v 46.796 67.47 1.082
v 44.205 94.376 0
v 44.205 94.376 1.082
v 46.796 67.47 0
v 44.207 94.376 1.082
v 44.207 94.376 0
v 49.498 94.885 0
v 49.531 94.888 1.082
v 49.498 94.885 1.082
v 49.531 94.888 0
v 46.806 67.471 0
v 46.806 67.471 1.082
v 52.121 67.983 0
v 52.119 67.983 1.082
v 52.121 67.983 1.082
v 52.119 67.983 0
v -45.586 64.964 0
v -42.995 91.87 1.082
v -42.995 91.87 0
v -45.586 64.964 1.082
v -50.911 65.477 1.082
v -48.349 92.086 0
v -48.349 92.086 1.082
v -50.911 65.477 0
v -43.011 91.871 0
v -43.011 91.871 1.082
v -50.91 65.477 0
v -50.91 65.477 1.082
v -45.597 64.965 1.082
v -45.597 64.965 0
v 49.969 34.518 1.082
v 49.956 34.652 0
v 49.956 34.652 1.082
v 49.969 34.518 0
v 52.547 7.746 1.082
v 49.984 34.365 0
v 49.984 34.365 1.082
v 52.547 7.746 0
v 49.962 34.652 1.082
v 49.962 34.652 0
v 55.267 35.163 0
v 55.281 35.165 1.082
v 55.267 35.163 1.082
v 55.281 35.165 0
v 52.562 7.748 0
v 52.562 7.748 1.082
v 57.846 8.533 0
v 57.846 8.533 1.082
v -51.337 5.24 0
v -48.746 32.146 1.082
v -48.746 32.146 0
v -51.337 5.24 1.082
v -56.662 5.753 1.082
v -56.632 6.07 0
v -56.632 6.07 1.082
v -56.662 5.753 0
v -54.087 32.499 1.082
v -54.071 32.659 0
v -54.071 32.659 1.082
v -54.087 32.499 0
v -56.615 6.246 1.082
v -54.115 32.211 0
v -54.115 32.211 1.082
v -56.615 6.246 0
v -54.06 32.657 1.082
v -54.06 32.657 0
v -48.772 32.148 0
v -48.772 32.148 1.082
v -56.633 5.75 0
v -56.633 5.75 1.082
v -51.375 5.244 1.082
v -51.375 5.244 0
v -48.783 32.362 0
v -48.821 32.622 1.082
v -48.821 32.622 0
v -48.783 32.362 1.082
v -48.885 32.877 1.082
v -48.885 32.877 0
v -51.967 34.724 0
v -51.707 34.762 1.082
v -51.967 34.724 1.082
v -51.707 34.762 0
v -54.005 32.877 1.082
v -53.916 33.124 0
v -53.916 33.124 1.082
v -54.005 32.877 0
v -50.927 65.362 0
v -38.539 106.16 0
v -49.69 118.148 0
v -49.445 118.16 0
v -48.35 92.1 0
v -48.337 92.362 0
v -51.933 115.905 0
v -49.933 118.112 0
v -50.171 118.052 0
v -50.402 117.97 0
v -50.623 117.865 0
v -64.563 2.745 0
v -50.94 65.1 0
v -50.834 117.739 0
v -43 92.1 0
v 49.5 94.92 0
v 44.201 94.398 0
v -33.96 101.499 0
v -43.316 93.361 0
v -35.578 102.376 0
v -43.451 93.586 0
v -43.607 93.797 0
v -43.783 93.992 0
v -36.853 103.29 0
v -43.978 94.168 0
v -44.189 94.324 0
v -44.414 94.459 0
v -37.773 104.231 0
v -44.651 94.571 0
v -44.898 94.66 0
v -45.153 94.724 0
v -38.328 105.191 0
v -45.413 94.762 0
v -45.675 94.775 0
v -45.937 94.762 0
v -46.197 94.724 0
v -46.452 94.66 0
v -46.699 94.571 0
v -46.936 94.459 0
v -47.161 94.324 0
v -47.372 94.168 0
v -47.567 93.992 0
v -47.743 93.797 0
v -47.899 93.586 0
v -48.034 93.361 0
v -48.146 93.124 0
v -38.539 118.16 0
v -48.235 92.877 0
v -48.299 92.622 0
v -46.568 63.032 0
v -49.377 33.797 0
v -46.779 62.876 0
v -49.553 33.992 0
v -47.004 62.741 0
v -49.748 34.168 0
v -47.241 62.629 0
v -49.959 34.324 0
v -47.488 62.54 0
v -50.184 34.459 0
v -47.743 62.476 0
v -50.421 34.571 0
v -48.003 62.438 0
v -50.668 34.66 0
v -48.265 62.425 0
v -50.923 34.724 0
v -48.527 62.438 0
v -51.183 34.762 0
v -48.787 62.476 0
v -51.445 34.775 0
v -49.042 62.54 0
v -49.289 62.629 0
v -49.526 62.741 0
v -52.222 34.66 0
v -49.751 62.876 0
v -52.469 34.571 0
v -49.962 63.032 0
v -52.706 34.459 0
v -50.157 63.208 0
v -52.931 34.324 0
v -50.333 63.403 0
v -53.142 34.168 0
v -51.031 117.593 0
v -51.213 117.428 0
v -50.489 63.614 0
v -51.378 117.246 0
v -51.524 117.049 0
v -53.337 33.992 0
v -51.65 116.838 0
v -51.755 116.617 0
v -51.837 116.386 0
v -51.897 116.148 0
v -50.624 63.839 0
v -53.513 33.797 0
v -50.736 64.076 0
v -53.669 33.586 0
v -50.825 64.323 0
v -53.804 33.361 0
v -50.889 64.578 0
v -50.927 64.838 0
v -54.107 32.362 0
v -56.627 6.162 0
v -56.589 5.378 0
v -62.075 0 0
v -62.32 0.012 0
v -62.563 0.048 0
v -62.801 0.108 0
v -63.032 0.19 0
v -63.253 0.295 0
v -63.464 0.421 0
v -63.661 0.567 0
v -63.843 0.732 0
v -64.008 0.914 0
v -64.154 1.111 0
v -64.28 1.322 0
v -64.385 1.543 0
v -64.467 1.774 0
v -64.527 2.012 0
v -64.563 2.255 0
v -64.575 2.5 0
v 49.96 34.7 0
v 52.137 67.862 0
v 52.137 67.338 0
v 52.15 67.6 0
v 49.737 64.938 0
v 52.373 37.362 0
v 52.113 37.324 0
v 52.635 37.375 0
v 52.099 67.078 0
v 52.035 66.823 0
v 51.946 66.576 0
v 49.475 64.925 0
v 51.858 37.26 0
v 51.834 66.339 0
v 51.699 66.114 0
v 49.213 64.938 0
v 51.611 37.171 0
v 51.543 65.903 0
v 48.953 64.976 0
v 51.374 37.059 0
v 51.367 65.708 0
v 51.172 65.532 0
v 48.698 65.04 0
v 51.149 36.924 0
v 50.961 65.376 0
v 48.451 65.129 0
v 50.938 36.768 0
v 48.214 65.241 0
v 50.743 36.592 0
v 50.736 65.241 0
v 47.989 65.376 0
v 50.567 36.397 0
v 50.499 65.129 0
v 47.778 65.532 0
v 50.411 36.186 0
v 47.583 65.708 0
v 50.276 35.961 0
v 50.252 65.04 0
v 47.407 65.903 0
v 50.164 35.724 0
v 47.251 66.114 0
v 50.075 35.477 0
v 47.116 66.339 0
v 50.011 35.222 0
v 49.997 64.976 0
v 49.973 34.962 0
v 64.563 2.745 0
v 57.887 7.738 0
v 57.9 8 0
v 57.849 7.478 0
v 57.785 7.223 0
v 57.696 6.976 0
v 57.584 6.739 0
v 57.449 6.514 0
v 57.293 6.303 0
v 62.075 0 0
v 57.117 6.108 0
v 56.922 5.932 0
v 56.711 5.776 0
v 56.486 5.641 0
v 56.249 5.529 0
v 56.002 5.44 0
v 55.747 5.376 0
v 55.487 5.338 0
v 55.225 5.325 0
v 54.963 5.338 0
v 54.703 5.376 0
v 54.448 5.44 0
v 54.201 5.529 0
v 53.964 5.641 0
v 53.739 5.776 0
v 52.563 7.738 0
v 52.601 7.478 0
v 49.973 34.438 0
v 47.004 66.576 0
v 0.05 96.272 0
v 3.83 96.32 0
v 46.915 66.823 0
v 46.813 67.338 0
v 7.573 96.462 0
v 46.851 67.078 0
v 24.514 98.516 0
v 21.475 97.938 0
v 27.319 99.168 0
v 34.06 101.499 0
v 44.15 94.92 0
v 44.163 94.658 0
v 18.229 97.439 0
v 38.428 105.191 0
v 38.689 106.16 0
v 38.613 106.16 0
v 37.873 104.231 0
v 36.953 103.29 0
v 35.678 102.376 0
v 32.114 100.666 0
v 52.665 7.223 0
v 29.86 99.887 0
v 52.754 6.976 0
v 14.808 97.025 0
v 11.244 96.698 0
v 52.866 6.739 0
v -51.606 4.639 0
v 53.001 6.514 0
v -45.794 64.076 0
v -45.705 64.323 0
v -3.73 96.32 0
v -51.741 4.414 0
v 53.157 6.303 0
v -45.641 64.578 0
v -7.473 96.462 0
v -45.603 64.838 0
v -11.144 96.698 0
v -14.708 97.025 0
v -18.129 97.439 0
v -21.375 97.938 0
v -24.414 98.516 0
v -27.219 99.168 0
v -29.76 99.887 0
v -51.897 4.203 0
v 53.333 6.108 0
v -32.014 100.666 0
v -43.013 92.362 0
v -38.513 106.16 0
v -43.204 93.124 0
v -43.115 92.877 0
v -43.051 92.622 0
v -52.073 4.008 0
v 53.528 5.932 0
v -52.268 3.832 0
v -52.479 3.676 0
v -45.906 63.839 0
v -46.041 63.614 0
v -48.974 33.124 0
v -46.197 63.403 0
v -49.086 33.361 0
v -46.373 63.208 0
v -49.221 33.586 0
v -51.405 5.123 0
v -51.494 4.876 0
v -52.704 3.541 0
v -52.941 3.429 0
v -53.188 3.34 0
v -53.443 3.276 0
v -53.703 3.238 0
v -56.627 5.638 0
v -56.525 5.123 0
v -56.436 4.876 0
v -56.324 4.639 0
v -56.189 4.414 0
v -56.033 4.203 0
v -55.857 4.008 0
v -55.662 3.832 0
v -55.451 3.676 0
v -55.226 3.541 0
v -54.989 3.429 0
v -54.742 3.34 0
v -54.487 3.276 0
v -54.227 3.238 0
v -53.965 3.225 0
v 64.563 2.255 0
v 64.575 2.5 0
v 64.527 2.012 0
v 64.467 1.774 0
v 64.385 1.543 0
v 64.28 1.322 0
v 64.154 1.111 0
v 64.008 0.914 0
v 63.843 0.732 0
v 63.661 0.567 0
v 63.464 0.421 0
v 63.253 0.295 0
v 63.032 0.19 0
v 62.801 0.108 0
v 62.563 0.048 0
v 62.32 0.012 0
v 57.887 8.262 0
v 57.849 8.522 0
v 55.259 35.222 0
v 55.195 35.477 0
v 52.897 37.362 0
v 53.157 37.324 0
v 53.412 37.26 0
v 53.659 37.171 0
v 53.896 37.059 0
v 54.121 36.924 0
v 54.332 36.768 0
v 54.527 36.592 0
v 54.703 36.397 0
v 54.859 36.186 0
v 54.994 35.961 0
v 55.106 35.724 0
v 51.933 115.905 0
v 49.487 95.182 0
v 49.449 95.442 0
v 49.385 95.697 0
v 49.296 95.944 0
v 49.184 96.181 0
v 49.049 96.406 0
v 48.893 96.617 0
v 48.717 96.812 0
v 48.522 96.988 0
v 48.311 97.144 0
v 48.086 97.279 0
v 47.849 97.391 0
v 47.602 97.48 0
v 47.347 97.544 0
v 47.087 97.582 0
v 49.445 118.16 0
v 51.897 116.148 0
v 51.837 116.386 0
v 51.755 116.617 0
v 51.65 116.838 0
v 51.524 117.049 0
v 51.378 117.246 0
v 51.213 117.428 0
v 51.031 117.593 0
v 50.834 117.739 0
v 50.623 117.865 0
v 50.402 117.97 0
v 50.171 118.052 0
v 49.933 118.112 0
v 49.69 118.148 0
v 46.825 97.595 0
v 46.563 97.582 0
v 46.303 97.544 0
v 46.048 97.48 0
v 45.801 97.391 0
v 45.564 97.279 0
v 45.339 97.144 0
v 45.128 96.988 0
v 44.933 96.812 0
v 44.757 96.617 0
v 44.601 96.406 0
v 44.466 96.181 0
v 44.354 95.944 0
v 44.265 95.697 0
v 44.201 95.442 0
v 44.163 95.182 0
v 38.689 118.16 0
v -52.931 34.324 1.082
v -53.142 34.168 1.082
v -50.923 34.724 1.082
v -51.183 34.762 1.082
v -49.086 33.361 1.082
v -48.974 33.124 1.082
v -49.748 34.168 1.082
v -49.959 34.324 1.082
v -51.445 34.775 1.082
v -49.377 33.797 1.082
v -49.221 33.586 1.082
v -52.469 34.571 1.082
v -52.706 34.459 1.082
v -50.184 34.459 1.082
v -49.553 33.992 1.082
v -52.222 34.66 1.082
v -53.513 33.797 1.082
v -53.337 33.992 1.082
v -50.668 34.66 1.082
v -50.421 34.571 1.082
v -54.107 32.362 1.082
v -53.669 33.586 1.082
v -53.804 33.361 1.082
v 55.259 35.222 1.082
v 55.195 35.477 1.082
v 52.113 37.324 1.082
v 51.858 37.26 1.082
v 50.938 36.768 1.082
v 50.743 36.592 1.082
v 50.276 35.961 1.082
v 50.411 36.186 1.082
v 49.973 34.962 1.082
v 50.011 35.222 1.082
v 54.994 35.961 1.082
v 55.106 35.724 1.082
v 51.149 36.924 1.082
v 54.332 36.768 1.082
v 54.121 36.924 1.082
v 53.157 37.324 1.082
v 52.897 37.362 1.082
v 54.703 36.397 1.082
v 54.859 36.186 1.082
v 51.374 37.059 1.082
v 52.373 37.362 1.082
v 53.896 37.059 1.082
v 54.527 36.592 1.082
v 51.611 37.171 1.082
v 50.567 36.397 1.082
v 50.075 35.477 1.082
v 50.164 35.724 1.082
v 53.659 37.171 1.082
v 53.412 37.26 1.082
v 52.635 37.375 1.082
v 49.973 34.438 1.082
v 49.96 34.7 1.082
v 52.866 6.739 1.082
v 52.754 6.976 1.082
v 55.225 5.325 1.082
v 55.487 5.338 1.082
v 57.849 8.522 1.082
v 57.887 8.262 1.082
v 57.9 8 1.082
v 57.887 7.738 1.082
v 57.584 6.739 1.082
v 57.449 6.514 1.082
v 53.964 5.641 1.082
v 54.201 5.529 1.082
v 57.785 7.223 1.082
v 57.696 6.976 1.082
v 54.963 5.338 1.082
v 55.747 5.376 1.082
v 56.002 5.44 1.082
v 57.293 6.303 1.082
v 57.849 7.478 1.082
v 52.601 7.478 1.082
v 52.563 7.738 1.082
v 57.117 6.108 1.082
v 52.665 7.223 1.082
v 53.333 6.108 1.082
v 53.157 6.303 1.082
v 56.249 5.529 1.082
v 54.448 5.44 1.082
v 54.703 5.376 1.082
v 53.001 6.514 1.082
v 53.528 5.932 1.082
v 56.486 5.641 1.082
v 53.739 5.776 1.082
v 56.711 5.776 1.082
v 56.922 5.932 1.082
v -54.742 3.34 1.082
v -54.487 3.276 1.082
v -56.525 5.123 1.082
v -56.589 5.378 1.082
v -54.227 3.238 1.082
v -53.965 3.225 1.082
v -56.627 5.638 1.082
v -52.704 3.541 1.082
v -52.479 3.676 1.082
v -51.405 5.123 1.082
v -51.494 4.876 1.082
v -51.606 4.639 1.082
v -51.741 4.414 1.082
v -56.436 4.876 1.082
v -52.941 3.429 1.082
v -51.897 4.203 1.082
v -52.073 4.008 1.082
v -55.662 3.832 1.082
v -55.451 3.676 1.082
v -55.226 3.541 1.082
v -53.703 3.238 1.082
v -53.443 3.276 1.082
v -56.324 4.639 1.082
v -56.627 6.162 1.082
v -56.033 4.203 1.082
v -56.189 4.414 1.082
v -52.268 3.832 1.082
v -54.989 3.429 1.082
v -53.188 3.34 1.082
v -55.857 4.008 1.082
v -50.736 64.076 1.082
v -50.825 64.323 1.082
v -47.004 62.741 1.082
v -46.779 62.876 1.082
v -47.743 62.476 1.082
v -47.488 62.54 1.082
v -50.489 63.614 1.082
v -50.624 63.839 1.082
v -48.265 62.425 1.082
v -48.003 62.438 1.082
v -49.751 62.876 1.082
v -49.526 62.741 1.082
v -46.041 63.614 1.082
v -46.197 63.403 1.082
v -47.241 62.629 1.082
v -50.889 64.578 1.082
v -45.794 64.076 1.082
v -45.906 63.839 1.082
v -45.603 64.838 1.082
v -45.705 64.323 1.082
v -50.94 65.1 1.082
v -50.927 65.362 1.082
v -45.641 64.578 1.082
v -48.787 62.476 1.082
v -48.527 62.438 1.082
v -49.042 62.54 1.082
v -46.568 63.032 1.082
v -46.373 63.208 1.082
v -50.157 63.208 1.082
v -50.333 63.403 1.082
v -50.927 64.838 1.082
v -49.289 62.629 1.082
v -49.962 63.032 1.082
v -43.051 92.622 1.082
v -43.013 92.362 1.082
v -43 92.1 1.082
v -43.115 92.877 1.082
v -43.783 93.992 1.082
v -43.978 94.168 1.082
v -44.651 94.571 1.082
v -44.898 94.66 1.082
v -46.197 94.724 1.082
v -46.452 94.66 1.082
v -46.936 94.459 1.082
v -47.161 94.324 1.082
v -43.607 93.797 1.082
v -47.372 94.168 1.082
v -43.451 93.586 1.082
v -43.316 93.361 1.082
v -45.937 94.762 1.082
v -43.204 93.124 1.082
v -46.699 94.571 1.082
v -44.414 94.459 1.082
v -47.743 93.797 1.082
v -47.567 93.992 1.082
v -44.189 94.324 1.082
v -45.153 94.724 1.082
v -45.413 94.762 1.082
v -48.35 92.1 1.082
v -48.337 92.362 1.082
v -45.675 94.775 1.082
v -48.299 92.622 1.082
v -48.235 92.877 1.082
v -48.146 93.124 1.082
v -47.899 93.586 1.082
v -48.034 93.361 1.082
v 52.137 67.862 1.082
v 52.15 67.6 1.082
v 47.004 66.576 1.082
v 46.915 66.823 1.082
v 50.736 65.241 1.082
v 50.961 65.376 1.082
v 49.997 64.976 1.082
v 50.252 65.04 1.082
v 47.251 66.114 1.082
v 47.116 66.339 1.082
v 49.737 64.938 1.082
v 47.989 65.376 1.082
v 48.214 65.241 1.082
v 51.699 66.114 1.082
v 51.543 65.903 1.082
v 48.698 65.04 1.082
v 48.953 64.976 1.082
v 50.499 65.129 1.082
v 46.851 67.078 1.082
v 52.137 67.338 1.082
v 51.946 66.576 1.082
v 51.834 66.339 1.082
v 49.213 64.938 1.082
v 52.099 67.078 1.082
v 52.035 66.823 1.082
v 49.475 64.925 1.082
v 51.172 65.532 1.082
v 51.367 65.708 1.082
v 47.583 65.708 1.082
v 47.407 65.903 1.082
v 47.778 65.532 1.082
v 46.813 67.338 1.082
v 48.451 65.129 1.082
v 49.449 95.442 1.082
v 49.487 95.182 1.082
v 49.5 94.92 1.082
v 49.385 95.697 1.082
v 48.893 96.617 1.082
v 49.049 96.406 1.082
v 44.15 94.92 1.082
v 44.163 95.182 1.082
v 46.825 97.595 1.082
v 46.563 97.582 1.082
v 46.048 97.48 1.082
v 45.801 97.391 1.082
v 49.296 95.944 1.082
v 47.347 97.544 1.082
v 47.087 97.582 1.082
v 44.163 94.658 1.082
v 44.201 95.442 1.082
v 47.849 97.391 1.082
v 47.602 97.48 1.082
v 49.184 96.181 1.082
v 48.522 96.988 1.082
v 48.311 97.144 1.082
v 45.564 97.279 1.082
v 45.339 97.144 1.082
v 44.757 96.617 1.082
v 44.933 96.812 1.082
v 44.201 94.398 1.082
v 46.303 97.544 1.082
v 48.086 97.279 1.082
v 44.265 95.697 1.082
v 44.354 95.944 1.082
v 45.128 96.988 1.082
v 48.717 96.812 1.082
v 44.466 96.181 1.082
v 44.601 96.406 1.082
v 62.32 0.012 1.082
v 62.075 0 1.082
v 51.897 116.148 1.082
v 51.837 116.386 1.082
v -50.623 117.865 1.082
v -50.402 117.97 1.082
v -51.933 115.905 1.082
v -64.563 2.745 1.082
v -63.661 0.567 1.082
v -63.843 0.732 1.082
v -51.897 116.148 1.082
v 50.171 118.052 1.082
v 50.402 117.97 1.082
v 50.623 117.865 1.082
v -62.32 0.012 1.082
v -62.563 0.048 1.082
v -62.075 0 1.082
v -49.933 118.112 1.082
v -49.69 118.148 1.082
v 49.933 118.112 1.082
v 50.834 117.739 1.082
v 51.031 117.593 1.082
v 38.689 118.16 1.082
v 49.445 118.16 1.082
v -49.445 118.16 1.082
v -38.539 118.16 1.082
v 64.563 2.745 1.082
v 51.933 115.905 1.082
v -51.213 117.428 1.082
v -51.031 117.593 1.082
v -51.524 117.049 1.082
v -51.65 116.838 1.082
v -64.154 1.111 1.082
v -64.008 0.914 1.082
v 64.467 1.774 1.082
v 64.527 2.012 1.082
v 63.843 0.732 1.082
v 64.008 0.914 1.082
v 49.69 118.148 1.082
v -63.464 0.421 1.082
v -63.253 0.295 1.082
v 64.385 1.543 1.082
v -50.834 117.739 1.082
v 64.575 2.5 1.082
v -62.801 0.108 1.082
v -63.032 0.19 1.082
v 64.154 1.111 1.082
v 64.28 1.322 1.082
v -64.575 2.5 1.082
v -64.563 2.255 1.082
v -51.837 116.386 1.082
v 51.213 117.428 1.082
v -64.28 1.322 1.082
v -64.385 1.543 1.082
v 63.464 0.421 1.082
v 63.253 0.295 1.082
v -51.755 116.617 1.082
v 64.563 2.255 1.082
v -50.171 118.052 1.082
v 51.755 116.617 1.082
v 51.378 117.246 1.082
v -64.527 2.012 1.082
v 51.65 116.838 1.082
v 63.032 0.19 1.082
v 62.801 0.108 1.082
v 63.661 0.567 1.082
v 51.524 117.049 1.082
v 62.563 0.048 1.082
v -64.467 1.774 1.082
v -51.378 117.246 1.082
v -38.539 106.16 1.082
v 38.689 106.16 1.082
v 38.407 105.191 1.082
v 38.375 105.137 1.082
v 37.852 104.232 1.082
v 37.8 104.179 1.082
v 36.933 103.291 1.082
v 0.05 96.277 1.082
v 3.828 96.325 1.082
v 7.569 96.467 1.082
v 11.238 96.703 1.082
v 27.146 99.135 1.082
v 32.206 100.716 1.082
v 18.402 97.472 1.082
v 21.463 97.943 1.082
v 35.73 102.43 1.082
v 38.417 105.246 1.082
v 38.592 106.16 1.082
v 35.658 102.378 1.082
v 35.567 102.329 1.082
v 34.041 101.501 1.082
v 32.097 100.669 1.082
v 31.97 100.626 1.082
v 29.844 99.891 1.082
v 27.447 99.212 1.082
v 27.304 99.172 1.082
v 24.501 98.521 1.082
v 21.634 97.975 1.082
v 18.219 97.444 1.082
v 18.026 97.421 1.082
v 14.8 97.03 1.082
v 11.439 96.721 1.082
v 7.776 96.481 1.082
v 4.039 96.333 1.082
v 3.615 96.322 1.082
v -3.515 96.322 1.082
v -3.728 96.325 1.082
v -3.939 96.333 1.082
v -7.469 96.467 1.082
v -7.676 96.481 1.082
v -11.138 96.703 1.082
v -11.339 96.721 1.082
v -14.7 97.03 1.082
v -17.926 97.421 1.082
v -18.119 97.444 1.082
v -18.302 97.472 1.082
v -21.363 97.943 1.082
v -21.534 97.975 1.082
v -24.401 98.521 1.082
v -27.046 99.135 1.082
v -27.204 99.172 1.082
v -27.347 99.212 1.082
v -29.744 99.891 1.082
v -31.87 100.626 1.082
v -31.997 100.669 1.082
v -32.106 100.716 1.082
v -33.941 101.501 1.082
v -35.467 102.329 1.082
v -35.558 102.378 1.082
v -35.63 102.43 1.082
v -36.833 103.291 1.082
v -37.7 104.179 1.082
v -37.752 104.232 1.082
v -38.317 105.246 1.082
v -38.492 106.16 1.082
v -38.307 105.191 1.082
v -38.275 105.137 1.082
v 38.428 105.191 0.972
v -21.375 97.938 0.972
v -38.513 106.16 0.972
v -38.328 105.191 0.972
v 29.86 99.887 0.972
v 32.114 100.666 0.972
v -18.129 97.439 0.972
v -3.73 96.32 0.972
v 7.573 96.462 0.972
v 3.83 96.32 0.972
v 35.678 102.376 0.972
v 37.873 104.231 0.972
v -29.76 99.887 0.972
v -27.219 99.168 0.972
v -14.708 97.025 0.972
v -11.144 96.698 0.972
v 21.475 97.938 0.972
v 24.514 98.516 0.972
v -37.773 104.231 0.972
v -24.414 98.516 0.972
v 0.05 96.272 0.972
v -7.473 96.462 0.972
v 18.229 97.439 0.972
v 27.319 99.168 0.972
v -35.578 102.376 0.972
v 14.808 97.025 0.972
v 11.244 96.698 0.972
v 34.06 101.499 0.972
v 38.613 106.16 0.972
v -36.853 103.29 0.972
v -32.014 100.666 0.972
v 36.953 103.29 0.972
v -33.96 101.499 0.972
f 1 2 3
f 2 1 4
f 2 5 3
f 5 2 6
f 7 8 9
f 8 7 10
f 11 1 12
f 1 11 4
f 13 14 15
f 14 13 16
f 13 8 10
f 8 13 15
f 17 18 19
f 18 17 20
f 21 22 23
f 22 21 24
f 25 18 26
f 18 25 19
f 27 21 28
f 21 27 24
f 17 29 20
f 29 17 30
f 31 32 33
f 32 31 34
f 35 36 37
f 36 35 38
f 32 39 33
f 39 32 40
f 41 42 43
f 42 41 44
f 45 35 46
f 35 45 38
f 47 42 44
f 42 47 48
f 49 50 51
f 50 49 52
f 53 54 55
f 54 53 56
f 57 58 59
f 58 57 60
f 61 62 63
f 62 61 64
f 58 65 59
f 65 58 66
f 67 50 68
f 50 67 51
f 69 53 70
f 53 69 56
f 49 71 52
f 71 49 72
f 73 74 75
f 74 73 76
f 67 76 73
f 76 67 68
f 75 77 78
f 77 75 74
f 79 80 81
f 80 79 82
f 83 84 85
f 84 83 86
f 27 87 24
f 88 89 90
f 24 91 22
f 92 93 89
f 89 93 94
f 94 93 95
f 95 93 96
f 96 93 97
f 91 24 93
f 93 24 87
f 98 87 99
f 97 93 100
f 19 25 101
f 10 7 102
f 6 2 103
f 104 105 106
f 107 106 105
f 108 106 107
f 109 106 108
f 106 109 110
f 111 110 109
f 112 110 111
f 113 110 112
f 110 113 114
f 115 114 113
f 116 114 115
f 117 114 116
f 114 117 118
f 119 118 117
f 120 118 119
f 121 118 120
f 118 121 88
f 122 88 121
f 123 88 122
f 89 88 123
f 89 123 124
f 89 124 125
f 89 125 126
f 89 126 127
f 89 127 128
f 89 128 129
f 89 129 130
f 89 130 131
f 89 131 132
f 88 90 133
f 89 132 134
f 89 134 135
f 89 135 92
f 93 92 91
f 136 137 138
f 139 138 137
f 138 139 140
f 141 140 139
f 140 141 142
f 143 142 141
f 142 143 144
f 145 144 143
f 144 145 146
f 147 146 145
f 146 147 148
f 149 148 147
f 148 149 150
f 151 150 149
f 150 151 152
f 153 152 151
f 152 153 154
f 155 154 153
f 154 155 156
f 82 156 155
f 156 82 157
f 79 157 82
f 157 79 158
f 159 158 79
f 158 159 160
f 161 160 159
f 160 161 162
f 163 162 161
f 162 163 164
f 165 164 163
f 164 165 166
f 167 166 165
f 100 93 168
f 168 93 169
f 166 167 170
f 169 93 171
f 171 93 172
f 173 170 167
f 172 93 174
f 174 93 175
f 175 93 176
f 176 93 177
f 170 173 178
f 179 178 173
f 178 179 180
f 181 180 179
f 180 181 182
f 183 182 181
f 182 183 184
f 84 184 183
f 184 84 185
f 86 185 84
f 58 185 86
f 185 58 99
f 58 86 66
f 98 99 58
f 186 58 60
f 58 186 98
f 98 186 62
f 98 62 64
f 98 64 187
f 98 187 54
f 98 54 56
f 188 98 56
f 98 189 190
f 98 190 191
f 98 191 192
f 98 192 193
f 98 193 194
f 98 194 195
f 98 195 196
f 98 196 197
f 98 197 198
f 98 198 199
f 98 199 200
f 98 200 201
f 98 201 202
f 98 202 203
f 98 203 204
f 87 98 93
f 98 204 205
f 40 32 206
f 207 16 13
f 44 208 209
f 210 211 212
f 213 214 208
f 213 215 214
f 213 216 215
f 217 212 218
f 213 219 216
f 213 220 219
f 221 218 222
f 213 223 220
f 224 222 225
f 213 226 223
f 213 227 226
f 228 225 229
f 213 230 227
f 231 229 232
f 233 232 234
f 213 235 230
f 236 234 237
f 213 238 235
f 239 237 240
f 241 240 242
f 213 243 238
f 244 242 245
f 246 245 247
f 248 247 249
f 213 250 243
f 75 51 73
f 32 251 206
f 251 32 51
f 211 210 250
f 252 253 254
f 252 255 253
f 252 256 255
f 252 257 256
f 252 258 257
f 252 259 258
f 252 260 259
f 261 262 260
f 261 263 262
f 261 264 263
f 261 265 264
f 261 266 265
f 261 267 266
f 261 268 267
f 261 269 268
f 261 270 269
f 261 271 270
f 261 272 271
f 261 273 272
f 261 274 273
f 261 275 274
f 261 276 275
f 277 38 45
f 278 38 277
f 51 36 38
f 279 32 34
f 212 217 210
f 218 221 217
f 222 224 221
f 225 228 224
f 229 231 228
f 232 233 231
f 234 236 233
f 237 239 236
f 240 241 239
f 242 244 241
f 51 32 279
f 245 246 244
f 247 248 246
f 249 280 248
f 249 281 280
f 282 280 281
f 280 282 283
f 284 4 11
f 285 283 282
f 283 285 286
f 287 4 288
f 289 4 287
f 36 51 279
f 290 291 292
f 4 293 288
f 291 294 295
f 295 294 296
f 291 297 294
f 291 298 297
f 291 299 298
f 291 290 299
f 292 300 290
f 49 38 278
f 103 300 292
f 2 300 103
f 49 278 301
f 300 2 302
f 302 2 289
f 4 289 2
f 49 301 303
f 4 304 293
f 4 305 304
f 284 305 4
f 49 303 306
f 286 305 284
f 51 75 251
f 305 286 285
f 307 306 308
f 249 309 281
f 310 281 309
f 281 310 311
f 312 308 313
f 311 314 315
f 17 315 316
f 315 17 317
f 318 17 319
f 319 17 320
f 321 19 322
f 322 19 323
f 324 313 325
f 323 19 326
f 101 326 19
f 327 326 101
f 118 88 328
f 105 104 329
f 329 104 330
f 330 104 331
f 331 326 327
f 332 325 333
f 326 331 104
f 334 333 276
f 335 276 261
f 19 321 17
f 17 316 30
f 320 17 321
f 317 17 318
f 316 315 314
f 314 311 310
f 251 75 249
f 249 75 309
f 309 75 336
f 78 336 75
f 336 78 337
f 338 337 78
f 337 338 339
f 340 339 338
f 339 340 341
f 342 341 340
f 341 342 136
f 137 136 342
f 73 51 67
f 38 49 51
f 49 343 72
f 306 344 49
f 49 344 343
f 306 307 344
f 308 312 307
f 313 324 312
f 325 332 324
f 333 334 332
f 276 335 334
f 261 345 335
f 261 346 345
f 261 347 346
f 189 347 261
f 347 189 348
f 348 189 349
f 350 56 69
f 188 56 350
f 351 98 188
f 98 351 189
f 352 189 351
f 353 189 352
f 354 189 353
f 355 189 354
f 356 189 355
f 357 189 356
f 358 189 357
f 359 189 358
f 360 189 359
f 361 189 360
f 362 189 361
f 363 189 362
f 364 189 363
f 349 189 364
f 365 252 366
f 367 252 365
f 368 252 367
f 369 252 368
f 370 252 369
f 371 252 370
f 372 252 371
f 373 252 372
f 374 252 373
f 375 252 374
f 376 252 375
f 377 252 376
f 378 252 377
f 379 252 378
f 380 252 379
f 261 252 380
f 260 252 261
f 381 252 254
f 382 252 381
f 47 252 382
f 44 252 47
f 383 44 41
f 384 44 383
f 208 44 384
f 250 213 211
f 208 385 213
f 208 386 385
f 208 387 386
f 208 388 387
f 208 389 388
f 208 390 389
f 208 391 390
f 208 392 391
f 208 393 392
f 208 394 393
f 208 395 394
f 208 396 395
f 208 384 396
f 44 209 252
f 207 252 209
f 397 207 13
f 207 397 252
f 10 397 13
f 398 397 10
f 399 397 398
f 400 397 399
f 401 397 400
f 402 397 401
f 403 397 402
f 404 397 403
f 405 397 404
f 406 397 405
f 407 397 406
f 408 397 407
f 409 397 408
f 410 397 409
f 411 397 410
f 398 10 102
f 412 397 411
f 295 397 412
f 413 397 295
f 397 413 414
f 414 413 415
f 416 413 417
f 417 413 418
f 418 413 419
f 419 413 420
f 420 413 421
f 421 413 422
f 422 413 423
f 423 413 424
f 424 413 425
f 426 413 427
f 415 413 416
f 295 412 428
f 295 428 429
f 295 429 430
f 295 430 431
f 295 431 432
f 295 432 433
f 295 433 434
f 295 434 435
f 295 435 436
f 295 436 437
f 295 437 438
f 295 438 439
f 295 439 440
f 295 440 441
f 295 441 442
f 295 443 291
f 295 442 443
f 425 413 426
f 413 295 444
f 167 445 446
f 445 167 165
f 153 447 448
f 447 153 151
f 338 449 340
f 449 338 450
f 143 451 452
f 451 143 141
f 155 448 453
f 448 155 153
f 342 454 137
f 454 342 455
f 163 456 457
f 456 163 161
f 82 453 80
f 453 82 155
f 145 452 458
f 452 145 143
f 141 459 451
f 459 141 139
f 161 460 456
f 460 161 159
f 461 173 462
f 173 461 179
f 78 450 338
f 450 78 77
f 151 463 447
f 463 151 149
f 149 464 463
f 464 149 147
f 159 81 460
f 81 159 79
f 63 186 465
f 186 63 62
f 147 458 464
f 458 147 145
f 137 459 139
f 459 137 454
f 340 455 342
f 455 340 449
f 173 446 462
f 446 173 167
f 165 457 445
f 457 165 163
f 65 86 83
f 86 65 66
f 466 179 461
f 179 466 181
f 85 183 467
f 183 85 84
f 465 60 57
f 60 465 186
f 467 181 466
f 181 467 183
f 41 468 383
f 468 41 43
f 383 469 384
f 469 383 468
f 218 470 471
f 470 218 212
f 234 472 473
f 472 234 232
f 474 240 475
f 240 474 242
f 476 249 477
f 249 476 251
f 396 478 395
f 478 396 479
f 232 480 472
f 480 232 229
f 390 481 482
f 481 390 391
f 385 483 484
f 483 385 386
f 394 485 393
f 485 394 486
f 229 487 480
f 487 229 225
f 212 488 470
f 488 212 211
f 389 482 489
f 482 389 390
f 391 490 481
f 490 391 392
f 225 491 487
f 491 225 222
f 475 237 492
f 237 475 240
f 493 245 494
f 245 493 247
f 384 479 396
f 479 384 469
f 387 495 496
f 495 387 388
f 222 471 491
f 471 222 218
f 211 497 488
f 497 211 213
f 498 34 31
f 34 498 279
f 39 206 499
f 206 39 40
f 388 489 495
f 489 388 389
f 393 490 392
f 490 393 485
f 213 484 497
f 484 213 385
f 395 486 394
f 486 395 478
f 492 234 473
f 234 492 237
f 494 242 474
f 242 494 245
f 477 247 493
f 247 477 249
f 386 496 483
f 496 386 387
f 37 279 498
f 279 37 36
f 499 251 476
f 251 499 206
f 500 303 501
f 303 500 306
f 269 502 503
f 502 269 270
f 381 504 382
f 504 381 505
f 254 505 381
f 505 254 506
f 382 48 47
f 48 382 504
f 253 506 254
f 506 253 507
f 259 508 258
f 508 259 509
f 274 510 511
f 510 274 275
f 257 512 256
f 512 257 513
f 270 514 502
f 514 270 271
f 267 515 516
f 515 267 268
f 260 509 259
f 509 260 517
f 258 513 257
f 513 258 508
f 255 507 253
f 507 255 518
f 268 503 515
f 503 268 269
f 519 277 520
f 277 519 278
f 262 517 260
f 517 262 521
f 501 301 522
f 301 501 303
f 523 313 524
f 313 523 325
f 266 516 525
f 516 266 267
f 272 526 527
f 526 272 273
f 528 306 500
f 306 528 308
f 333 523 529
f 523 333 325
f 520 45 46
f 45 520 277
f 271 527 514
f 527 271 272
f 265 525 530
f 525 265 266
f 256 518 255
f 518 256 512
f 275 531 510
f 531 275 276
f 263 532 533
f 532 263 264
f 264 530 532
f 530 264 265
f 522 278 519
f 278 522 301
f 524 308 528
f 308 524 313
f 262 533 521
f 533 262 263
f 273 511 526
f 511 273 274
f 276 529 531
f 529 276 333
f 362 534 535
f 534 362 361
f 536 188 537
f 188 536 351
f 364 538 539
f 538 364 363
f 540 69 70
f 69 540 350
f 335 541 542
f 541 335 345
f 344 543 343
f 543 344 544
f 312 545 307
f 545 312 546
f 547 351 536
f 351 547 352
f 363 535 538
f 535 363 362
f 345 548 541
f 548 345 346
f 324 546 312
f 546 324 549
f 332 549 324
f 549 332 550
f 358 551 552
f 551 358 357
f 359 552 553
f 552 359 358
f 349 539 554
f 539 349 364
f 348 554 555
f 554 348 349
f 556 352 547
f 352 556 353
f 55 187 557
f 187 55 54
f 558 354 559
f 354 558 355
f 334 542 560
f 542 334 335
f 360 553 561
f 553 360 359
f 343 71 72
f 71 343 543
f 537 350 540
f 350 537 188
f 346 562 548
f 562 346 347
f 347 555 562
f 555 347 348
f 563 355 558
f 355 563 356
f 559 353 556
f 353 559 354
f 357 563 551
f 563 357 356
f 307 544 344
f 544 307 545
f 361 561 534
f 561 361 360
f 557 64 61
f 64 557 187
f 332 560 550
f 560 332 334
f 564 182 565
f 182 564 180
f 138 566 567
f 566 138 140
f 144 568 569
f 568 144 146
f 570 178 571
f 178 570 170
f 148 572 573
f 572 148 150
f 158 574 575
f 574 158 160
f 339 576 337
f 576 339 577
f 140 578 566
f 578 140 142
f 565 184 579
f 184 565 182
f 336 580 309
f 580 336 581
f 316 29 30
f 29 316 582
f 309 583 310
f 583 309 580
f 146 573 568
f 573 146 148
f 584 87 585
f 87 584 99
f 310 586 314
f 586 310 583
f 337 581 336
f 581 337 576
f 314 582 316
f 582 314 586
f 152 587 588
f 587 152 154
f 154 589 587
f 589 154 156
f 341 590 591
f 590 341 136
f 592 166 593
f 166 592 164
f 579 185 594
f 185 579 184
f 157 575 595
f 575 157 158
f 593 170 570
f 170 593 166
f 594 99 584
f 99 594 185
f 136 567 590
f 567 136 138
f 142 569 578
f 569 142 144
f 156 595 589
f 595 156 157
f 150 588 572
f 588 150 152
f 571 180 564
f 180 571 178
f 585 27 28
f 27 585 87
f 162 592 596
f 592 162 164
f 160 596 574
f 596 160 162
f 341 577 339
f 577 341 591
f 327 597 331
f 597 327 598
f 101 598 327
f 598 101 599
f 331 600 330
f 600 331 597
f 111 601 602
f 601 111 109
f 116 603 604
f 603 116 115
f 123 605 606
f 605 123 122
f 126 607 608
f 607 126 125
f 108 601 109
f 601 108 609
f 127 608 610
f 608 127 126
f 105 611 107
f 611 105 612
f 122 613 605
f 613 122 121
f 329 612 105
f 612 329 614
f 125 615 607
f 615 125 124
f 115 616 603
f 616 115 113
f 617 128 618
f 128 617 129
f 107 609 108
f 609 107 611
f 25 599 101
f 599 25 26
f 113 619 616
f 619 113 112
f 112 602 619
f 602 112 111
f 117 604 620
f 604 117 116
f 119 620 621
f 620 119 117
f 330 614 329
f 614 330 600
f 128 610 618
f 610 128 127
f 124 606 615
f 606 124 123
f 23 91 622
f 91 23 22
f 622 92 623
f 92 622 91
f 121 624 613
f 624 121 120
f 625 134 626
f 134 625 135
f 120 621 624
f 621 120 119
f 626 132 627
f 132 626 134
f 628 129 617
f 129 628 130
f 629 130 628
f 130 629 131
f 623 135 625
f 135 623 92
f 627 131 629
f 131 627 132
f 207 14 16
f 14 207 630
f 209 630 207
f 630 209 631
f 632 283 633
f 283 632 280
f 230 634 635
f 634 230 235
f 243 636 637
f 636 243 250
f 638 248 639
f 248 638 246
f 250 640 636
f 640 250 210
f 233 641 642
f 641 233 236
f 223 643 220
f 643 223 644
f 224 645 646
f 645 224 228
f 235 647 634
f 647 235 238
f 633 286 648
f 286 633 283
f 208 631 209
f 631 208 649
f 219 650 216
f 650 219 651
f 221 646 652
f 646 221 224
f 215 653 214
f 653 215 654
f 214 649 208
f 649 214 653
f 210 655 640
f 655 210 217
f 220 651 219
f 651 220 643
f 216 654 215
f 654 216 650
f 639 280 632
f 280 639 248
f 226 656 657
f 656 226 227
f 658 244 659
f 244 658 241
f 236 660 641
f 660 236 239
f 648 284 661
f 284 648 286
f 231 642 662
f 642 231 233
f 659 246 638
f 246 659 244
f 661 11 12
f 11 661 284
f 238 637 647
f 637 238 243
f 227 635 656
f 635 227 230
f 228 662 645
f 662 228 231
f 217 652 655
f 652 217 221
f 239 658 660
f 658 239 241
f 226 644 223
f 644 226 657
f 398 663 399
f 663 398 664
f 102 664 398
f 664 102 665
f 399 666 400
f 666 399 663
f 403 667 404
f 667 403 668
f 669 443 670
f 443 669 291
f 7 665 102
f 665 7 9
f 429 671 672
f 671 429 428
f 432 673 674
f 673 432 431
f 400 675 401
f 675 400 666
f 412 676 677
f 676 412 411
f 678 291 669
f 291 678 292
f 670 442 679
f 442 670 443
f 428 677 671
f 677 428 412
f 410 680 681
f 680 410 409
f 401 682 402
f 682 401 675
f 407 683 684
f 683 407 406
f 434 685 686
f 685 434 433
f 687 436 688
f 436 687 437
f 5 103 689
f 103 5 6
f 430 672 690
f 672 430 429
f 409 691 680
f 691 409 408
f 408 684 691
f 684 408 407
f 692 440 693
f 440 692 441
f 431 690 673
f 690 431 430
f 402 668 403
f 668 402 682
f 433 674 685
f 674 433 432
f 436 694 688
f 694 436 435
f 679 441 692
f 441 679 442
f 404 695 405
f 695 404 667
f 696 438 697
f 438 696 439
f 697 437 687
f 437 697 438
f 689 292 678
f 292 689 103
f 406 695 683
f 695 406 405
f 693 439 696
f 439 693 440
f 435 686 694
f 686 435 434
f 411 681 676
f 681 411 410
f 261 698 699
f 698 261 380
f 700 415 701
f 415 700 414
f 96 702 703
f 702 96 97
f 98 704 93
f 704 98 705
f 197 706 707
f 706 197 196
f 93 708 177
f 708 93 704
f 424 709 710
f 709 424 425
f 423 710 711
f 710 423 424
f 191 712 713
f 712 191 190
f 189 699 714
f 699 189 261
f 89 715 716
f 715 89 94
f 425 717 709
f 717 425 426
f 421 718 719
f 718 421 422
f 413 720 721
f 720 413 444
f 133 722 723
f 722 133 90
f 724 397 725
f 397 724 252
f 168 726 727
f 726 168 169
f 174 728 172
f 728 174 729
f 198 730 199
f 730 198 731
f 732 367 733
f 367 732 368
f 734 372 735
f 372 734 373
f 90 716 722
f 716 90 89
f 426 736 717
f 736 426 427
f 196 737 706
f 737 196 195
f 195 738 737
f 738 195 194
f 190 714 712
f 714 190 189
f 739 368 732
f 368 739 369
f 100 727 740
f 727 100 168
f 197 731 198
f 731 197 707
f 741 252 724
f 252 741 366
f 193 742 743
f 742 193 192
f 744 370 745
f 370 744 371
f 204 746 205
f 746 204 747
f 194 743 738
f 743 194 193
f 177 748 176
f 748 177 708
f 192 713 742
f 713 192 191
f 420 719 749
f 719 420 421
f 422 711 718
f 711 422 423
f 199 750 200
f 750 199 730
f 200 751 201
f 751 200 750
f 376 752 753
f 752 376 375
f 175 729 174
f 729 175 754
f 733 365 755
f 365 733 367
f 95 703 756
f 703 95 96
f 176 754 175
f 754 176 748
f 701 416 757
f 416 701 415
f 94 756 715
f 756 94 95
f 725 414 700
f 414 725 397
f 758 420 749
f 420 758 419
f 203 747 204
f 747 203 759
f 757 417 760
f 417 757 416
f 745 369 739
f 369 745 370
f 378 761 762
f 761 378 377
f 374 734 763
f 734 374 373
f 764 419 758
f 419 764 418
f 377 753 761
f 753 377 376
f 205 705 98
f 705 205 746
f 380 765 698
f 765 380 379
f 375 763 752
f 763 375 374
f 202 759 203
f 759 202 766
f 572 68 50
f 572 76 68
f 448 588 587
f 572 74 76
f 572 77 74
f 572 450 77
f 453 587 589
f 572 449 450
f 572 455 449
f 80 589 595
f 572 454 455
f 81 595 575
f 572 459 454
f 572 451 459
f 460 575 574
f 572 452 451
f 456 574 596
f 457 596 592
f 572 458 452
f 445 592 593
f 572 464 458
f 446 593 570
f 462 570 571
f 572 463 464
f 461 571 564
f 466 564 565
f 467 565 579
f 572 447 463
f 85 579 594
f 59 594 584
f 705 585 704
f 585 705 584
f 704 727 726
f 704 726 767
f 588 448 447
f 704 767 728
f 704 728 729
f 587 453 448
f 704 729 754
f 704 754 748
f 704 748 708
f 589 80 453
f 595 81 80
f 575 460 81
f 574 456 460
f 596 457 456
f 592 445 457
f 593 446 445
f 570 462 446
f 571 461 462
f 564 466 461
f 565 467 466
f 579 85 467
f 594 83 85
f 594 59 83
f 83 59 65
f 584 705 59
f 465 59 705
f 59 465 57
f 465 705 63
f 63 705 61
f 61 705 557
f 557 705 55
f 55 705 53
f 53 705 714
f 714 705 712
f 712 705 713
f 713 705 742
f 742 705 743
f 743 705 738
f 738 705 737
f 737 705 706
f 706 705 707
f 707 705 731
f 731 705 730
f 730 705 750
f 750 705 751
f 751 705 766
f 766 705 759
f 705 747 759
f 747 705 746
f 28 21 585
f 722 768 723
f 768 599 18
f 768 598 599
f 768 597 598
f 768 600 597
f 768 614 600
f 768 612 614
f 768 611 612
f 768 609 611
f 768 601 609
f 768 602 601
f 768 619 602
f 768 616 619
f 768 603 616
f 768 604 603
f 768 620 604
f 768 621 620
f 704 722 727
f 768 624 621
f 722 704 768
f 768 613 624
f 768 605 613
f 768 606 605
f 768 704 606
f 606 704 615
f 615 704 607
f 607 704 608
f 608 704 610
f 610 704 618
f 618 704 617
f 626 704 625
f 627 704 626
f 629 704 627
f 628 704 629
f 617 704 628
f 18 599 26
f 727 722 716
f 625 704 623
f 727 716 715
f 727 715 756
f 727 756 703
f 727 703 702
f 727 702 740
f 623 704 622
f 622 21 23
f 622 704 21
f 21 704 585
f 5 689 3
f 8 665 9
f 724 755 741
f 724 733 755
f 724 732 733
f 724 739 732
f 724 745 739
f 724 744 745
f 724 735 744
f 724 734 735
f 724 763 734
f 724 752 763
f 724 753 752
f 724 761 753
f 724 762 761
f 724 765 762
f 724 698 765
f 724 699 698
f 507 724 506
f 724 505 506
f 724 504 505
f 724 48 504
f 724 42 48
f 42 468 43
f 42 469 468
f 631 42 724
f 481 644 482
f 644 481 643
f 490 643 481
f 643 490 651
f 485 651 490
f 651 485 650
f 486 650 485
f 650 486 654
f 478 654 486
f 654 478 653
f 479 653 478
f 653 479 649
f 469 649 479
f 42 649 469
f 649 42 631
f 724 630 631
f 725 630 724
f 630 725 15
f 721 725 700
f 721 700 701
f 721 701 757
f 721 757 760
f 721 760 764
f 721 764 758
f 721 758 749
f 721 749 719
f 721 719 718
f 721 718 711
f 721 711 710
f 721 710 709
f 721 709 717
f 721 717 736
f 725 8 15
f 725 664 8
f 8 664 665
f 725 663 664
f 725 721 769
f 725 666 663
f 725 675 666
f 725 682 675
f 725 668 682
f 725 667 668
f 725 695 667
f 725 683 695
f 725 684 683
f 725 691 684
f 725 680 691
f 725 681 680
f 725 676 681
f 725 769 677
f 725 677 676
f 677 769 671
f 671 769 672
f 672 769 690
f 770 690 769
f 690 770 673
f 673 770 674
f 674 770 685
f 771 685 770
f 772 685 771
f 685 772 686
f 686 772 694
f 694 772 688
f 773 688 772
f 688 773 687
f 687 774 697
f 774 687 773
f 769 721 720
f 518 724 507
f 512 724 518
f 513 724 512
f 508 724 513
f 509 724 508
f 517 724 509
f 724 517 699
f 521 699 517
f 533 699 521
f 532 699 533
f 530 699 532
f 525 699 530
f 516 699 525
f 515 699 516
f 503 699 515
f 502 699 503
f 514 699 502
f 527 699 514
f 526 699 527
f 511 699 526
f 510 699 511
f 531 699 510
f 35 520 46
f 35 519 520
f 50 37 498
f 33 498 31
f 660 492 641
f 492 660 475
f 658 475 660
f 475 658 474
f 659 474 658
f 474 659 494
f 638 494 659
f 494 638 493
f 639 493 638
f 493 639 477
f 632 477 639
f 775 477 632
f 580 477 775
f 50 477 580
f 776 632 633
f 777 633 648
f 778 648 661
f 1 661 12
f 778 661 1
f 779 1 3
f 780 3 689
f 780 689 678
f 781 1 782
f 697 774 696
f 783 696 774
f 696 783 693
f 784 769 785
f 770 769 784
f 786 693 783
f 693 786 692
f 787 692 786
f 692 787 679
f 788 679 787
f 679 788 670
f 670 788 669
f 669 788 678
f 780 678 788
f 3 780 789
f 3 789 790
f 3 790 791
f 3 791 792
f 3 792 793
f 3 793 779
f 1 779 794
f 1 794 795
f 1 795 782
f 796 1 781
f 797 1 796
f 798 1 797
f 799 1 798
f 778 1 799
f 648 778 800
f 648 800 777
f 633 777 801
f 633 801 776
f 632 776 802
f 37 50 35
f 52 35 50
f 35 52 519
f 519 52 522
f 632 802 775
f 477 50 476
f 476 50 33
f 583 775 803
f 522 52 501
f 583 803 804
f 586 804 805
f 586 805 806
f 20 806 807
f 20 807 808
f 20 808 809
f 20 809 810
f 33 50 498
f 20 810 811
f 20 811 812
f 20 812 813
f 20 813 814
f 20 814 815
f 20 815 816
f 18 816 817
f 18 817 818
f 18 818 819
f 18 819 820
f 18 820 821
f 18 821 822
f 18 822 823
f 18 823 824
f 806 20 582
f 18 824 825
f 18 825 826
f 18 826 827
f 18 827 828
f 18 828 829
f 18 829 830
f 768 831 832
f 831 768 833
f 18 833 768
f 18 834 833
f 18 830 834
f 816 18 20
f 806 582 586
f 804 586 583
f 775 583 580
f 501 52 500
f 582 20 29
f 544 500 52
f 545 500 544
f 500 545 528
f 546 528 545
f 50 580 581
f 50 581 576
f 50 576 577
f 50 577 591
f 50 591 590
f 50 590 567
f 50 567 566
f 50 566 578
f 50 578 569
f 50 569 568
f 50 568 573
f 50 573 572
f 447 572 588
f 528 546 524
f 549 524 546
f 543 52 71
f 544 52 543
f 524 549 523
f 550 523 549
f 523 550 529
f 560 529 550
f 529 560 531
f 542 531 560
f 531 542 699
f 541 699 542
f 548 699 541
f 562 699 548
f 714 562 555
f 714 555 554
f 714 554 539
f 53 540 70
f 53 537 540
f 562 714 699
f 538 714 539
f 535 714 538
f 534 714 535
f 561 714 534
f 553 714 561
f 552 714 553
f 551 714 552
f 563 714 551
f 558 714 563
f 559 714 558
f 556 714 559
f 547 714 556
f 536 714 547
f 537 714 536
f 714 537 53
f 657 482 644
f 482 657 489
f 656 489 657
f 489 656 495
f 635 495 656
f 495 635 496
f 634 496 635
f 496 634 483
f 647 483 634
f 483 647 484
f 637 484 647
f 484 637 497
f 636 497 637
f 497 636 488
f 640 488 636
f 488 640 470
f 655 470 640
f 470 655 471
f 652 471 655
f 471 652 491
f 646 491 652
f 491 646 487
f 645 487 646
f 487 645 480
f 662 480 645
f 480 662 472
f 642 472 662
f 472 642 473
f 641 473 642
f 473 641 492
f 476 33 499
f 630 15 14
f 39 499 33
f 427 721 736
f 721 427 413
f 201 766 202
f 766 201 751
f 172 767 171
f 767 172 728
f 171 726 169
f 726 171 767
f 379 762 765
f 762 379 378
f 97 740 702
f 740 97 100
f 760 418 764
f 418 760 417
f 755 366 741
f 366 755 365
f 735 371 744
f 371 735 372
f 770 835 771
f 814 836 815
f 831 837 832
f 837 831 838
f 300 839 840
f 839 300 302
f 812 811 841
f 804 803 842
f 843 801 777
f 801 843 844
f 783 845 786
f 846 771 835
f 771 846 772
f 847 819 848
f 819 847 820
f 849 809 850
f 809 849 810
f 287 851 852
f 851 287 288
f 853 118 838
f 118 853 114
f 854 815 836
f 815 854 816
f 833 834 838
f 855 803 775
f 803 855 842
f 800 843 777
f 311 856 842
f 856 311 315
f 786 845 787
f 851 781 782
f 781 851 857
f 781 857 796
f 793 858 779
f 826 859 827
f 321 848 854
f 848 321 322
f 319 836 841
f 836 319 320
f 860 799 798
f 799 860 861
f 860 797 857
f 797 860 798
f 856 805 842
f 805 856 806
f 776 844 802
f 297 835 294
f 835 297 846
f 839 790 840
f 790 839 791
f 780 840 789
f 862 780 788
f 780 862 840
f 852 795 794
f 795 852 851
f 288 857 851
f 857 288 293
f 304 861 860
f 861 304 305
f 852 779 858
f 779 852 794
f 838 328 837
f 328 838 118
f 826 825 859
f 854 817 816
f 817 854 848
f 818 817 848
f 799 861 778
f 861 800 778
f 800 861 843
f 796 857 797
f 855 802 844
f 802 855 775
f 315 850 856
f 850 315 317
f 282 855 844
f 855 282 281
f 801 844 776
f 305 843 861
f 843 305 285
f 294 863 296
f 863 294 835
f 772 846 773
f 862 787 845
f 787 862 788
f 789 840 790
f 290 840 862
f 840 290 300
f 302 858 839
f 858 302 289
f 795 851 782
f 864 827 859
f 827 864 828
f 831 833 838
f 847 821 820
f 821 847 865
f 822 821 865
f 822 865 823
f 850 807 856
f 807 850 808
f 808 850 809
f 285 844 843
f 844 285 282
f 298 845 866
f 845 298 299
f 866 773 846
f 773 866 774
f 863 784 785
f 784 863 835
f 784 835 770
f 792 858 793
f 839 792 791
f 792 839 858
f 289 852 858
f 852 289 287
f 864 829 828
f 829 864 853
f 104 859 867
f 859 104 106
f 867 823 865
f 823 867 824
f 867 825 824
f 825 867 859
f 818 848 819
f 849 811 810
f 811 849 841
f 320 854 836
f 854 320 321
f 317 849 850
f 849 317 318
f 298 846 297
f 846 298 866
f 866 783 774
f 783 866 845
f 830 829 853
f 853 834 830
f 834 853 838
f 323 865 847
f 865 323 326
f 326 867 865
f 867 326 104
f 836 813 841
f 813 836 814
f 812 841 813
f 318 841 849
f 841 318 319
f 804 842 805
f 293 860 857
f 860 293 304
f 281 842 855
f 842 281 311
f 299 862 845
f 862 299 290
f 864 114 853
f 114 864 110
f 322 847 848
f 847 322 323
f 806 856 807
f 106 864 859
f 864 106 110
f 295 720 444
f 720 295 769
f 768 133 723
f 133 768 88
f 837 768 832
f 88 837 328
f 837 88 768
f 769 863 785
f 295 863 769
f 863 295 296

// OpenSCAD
// Parameters
// Forearm Width 1 (mm)
$fn = 64;

width1 = 129.15; //[45:175]

// Forearm Width 2 (mm)
width2 = 103.89; //[25:155]

// Forearm Length 1 (mm)
length1 = 118.16; //[35:165]

// Forearm Origin (mm)
origin = 0;

// Forearm Height (smallest) (mm)
heightSmall = 1.04; //[.75:1.25]

// Forearm Height (main) = 2.52 mm
heightMain = heightSmall*1.04;

 
// Diameter fillet (mm)
diameter = 5; //[3:7]


//Add the circle ports 
radius = 8.32; //[3:12]
yShift = 7; //[4:13]

//square cutout for circle ports
squareRad = 6.86; //[3:10]

//Diameter for ports connected to the end of the main shape (w/ square cutouts)
circDiam = 18.65; //[15:20]

//linear extrude of circle ports (mm)
//trying to put the variable in terms of height of the base of the trapezoid
circExtrude = heightSmall*5.07692307692;

module mainShape(){
difference() {
difference() {
difference() {
difference() {
    // Main shape
    linear_extrude(height=heightMain) {
        hull() { 
            translate([origin+diameter/2, origin+diameter/2]) circle(d=diameter);
            translate([width1-diameter/2, origin+diameter/2]) circle(d=diameter);
            translate([((width1 - width2) / 2 + width2) - diameter/2, length1-diameter/2]) circle(d=diameter);
            translate([((width1 - width2) / 2) + diameter/2, length1 - diameter/2]) circle(d=diameter);
            polygon(points=[
                [origin+diameter/2, origin+diameter/2],
                [width1-diameter/2, origin+diameter/2],
                [((width1 - width2) / 2 + width2) - diameter/2, length1-diameter/2],
                [((width1 - width2) / 2) + diameter/2, length1 - diameter/2]
            ]); 
        }
        // Adding slight raised parts over oval cutouts
    rotations_2 = [-5.5, 5.5];
    x_positions_2 = [0, width1 - 17]; 
    y_positions_2 = [0, -12]; 

    for (i = [0 : len(rotations_2) - 1]) {
    rotate(rotations_2[i]) { 
        translate([x_positions_2[i], y_positions_2[i]]) {
            cube([15.55, 84.64, heightMain + 1.28], center = false); 
        }
    }
}        // Adding slight raised parts over oval cutouts
    rotations_2 = [-5.5, 5.5];
    x_positions_2 = [0, width1 - 17]; 
    y_positions_2 = [0, -12]; 

    for (i = [0 : len(rotations_2) - 1]) {
    rotate(rotations_2[i]) { 
        translate([x_positions_2[i], y_positions_2[i]]) {
            cube([15.55, 84.64, heightMain + 1.28], center = false); 
        }
    }
}
    }
    
    

    // Arrays for cube positions and rotations
    rotations = [5.5, -5.5, 5.5, -5.5];
    x_positions = [
        0.92915214866 * width1,
        0.07742934572 * width1,
        0.92915214866 * width1,
        0.07742934572 * width1
    ];
    y_positions = [
        0.59241706161 * length1,
        0.67704807041 * length1,
        0.0846310088  * length1,
        0.1692620176  * length1
    ];

    // Subtracting cubes using a loop
    for (i = [0 : len(rotations) - 1]) {
        rotate(rotations[i]) {
            translate([x_positions[i], y_positions[i]]) {
                cube([5.35, 27.03, 3 * circExtrude], center = true);
            }
        }
    }

    // Base positions for semicircle cutouts
    x_base = 0.07742934572 * width1;
    y_base = 0.1692620176 * length1;

    // Arrays for semicircle cutout offsets
    x_offsets = [3.13, 107.21, 109.8, 0.61, 6.31, 8.9, 104.05, 101.4];
    y_offsets = [12.1, 14.7, -12, -14.1, 45.1, 72.1, 47.6, 74.92];

    // Subtracting semicircle cutouts  using a loop
    for (i = [0 : len(x_offsets) - 1]) {
        translate([x_base + x_offsets[i], y_base + y_offsets[i]]) {
            cylinder(h = 3 * circExtrude, r = 5.35 / 2);
        }
    }

    
    //NEED TO MAKE THIS SCALABLE
    // Subtracting the scaled sphere to create a cutout

    translate([width1 / 2 +.05, -12 + length1]) {

        scale([1.95, .5, 1]) { // Scaling in x, y, z directions
            sphere(r = 19.8, center = true);
        }
    }
    
}

}
// Rectangle segment cutout
linear_extrude(height=circExtrude)  
translate([width1-63,length1-2])
cube([50,20,3*circExtrude],true);
translate([width1-64.5,length1-2]){
cube([(length1/1.53),20,3*circExtrude],true);
    }
}
}
 ; 
//Need to still figure out exact location of these circle ports in relation to rest of body



//Circular ports on the end of the main shape
 module gauntletPegHole(){
//Right port
 module port(){
    difference() {
        union() {
            linear_extrude(height=circExtrude, center=false, scale=0.75) {
                circle(d=18.65);
            }
                cube([10, 10, 10], center=false);
            
                cylinder(h=10, r=5);
        }
        cube([1, 1, 1]);
        }

 //Left Port
 difference()
 {
linear_extrude(height=circExtrude)  
translate([(width1-width2)/1.4,length1])
circle(radius);
translate([(width1-width2)/1.4,length1]){
cube([squareRad,squareRad,3*circExtrude],true);
    }
    
}
;

topPortWidth = 13.54;
topPortLength = 36.43;
topPortHeight = 5.02;

topPortX = (width1-topPortWidth)/2;
topPortY = (length1-topPortLength)/2;

translate([topPortX,topPortY,heightSmall]){
cube([topPortWidth,topPortLength,topPortHeight]);

translate([topPortX/8-.5,topPortY-7,0]){
cylinder(topPortHeight,topPortWidth/2+.3,topPortWidth/2+.3);
}

}

b = 10;
h = 10;
w = 4;

//Start with an extruded triangle
translate([topPortX+topPortWidth/2,topPortY,heightSmall]){
rotate(a=[180,-90,0])
linear_extrude(height = topPortWidth, center = true, convexity = 10, twist = 0)
polygon(points=[[0,0],[topPortHeight,0],[0,b]], paths=[[0,1,2]]);

}

}




// outline code for the ports

module gauntletPegHole() {
    difference() {
            linear_extrude(height=circExtrude, center=false, scale=0.75) {circle(d=circDiam);}
            translate([0,0,circExtrude/2]){
        cube([squareRad,squareRad,circExtrude], center = true);
        }
        }
        }
 
// Rendering modules
translate([-width1/2,0,0]) mainShape();
translate([-41.12, length1-circDiam/2]) gauntletPegHole();
mirror([0,1,0]) { translate([-41.12, length1-circDiam/2]) gauntletPegHole();}

        union() {
            linear_extrude(height=3, center=false, scale=0.75) {
                circle(d=18.65);
            }
            translate([0, 0, 0]) {
                cube([10, 10, 10], center=true);
            }
            translate([0, 0, 0]) {
                cylinder(h=10, r=5);
            }
        }
        cube([20, 20, 20]);
    }
}


// Rendering modules
translate([-width1/2,0,0]) mainShape();
//gauntletPegHole();
